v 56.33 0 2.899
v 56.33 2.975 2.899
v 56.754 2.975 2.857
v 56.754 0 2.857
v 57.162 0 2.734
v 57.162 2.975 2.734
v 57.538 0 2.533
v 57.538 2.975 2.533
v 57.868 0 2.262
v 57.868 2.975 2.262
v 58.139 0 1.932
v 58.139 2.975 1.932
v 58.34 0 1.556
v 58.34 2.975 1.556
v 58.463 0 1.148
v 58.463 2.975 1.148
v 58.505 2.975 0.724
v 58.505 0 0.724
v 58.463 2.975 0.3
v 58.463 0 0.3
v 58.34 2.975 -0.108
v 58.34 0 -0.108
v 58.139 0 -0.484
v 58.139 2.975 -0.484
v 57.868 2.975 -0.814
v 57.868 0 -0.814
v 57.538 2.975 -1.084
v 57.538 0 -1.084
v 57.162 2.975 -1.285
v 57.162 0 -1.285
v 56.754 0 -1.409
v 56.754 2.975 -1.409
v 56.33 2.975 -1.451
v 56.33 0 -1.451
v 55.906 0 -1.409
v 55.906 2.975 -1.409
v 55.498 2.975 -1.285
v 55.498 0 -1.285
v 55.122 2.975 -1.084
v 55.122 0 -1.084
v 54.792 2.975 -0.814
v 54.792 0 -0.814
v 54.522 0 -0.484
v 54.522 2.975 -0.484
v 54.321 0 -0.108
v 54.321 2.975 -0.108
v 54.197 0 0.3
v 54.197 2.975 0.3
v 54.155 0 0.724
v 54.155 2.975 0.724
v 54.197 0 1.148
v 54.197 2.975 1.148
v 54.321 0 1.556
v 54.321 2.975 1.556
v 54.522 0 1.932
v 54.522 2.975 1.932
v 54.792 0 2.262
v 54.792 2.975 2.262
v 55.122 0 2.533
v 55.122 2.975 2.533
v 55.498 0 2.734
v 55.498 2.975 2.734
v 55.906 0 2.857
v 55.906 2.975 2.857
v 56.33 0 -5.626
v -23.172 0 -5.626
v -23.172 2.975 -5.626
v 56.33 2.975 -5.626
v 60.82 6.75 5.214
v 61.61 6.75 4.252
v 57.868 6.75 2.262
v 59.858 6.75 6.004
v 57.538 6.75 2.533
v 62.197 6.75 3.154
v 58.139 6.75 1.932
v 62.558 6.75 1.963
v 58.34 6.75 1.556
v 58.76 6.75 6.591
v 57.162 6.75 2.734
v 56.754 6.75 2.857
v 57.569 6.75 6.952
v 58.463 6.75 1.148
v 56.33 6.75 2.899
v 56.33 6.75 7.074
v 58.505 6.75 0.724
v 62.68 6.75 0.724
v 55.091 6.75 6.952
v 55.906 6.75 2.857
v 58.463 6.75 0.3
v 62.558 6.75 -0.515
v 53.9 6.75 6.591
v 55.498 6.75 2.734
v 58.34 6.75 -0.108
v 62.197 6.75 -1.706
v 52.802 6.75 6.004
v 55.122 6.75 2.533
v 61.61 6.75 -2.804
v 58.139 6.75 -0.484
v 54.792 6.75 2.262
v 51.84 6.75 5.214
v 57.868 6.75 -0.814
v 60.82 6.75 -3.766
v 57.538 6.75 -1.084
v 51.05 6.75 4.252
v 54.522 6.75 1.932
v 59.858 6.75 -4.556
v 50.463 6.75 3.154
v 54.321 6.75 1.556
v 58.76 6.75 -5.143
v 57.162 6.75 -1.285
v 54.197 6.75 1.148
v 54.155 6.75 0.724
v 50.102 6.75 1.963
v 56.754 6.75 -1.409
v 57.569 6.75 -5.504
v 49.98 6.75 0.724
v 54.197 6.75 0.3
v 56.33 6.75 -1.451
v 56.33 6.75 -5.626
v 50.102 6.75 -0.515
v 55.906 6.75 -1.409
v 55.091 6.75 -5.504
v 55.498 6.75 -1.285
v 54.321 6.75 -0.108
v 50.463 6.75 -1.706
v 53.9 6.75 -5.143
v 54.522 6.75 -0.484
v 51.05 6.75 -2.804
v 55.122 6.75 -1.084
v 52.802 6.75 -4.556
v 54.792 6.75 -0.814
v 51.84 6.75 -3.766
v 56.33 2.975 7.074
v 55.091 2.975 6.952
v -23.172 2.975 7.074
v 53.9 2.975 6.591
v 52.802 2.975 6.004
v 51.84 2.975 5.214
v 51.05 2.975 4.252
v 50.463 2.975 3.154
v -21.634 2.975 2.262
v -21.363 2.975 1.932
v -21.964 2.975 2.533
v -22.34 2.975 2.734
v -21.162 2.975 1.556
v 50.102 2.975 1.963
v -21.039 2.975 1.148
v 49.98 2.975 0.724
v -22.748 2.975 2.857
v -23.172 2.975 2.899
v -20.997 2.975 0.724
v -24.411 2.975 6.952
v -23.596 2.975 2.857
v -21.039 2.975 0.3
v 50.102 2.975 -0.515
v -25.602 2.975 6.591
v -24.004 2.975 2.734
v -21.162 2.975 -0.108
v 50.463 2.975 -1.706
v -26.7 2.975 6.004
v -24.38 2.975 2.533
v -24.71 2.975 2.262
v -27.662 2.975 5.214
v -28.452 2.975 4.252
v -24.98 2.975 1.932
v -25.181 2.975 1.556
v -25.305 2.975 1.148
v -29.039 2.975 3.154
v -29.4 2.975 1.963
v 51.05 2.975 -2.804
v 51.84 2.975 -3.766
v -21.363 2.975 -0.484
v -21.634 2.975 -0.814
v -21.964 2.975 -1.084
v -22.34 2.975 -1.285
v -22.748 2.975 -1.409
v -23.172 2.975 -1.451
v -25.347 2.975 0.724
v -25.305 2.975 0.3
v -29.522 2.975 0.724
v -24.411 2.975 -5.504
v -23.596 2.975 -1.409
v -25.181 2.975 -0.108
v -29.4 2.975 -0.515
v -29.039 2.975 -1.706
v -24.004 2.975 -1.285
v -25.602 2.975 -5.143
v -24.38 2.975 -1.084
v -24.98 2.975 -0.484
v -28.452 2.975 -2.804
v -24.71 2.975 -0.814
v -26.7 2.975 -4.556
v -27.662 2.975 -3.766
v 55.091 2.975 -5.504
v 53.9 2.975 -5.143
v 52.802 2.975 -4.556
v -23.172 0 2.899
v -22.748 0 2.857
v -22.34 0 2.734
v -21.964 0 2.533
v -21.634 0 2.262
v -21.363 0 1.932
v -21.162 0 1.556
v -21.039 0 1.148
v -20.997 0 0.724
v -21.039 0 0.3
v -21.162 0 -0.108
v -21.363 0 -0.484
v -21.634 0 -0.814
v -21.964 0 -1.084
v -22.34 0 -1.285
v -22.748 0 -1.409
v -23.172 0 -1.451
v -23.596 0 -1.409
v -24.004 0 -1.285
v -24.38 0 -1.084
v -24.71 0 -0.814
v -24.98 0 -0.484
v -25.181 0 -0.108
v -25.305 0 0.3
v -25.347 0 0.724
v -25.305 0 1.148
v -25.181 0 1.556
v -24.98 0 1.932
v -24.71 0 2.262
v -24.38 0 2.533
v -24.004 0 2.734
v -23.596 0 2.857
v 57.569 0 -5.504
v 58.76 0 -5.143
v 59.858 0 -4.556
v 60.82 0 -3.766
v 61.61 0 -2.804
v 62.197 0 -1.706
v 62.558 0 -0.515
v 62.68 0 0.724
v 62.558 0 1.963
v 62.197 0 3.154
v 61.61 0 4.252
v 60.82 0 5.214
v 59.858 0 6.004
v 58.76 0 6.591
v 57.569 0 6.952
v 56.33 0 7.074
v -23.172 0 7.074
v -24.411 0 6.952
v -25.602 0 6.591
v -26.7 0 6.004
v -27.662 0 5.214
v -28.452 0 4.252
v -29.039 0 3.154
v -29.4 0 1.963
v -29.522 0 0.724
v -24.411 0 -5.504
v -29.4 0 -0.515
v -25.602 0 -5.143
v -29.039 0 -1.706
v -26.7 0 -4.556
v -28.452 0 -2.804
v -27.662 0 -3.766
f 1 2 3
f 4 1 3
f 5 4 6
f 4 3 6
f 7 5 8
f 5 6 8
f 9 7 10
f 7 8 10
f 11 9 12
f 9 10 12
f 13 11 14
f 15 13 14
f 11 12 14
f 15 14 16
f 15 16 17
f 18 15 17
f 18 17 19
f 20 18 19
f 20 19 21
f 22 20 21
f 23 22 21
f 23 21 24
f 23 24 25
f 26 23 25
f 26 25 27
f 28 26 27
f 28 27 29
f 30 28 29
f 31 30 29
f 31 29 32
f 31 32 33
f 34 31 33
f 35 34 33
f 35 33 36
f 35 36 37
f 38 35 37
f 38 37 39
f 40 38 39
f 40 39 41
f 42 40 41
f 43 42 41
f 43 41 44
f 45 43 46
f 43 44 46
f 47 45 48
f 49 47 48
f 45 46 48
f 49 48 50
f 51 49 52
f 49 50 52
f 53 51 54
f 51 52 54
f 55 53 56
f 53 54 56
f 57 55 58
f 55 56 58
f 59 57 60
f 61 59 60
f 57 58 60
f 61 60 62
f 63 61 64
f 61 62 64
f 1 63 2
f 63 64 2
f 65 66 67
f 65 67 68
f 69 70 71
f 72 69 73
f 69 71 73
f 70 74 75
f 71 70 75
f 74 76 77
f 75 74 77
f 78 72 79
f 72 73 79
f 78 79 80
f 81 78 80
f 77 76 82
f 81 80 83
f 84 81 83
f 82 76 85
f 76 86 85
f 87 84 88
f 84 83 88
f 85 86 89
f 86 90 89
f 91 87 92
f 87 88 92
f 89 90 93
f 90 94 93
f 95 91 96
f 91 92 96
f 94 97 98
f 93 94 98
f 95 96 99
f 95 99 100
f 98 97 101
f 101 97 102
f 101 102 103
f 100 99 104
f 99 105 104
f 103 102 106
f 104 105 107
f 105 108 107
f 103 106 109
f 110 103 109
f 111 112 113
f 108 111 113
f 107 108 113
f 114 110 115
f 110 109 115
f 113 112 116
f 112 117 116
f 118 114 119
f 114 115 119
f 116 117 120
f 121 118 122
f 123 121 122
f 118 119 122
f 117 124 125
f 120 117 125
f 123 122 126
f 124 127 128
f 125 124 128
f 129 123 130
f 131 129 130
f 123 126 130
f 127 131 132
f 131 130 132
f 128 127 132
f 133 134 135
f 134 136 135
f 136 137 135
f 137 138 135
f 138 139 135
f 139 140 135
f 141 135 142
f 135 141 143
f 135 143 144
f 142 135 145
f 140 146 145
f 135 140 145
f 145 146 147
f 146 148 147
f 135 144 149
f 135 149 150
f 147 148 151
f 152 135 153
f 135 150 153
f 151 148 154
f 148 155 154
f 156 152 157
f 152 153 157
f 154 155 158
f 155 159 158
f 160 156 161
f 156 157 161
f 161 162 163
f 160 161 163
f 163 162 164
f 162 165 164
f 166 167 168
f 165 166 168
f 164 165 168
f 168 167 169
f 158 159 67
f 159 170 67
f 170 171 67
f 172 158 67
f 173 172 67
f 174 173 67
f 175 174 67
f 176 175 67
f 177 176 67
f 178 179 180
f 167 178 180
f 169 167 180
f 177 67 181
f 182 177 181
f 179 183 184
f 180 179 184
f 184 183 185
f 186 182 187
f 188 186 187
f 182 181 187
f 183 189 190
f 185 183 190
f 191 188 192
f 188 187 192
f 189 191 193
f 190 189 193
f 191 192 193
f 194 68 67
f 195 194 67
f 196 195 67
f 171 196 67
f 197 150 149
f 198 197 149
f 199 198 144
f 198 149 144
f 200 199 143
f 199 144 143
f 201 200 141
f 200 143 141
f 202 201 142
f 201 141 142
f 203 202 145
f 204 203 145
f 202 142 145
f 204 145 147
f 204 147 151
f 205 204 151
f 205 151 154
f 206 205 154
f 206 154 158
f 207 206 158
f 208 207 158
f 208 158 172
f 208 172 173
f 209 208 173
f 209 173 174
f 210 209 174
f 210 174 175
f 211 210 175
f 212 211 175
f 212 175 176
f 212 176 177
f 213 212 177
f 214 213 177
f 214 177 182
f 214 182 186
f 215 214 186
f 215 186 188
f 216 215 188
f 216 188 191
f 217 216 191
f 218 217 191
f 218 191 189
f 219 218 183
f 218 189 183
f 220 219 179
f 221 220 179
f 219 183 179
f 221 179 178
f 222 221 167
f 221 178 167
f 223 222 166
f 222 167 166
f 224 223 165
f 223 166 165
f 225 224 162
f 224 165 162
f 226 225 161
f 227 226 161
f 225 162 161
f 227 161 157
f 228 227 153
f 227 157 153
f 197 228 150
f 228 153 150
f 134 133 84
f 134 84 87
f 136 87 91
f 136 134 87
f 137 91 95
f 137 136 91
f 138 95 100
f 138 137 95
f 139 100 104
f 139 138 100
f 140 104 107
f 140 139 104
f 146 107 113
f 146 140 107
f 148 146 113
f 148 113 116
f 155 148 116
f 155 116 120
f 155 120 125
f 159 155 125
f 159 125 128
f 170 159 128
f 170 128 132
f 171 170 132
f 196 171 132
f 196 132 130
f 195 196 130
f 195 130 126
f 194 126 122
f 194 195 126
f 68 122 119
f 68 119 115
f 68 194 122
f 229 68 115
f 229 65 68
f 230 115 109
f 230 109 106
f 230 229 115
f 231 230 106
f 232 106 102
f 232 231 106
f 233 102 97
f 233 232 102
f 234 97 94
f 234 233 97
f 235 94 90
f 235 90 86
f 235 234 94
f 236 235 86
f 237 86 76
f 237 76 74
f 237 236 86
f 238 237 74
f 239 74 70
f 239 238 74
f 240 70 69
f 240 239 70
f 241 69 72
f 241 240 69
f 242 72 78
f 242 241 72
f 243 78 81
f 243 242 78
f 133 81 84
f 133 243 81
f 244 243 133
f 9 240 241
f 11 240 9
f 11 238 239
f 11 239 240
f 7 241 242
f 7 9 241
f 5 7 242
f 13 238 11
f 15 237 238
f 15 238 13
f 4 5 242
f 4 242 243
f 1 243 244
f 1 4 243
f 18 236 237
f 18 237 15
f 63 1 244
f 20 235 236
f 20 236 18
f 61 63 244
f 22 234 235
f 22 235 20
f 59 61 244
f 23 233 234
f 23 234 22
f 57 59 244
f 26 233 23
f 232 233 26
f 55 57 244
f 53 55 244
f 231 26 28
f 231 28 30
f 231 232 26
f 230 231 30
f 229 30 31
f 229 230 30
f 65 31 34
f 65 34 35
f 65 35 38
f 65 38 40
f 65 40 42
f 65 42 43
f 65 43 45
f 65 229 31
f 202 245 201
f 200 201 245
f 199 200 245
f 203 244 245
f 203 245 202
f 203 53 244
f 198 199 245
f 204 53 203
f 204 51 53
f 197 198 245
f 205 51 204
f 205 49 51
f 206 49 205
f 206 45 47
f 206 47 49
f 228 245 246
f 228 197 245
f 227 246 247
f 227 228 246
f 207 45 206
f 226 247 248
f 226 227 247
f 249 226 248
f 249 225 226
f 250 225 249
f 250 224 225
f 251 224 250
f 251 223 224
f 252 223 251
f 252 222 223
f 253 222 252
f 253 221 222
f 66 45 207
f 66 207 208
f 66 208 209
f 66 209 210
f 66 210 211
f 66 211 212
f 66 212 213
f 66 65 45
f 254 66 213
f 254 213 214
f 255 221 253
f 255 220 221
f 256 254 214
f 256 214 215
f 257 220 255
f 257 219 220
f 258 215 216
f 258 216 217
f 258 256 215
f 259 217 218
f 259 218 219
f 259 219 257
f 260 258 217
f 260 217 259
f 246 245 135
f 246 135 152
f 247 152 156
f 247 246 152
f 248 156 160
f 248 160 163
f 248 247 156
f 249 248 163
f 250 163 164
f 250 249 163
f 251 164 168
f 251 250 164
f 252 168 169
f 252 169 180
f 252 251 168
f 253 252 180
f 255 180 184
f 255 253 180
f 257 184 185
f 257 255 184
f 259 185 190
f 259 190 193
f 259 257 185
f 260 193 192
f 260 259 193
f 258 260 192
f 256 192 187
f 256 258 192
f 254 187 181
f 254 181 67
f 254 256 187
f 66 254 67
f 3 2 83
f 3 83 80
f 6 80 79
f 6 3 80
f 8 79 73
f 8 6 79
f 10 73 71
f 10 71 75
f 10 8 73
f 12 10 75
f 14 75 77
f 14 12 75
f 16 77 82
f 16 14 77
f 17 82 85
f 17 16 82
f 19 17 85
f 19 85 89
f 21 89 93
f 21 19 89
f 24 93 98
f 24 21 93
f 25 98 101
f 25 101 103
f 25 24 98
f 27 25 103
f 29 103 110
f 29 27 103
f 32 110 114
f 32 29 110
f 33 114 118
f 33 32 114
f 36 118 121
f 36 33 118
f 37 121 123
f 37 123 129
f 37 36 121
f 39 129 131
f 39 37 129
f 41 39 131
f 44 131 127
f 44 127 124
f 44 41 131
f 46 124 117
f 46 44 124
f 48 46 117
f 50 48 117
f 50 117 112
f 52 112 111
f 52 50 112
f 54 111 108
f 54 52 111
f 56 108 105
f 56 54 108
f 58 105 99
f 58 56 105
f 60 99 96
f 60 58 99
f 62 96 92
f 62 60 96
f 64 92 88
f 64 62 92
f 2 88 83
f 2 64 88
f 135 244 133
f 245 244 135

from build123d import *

# Parameters (mm, degrees)
BOSS_EXTRUDE1_DEPTH = 2.975
SKETCH2_R           = 2.175
SKETCH2_R_2         = 2.175000000000007
CUT_EXTRUDE1_DEPTH  = 12.7
SKETCH3_R           = 2.175000000000007
BOSS_EXTRUDE2_DEPTH = 3.7750000000000004


with BuildPart() as part:
    # Sketch1 → Boss-Extrude1 (new body)
    with BuildSketch(Plane(origin=(0, 0, 0), x_dir=(1, 0, 0), z_dir=(0, 1, 0))):
        with BuildLine():
            Line((-23.171929824561392, 5.625877192982455), (56.3300701754386, 5.625877192982454))
            ThreePointArc((56.3300701754386, 5.625877192982454), (62.6800701754386, -0.7241228070175446), (56.3300701754386, -7.074122807017544))
            Line((56.3300701754386, -7.074122807017544), (-23.171929824561392, -7.074122807017544))
            ThreePointArc((-23.171929824561392, -7.074122807017544), (-29.52192982456139, -0.7241228070175436), (-23.171929824561392, 5.625877192982455))
        make_face()
    extrude(amount=BOSS_EXTRUDE1_DEPTH)

    # Sketch2 → Cut-Extrude1 (cut)
    with BuildSketch(Plane(origin=(0, 2.975, 0), x_dir=(1, 0, 0), z_dir=(0, 1, 0))):
        with Locations(Location((-23.171929824561392, -0.7241228070175446, 0), (0, 0, 270))):
            Circle(SKETCH2_R)
        with Locations(Location((56.3300701754386, -0.7241228070175446, 0), (0, 0, 270))):
            Circle(SKETCH2_R_2)
    extrude(amount=-CUT_EXTRUDE1_DEPTH, mode=Mode.SUBTRACT)

    # Sketch3 → Boss-Extrude2 (add)
    with BuildSketch(Plane(origin=(0, 2.975, 0), x_dir=(1, 0, 0), z_dir=(0, 1, 0))):
        with BuildLine():
            ThreePointArc((56.3300701754386, 5.625877192982454), (62.6800701754386, -0.7241228070175451), (56.3300701754386, -7.074122807017544))
            ThreePointArc((56.3300701754386, -7.074122807017544), (49.9800701754386, -0.7241228070175443), (56.3300701754386, 5.625877192982454))
        make_face()
        with Locations(Location((56.3300701754386, -0.7241228070175446, 0), (0, 0, 270))):
            Circle(SKETCH3_R, mode=Mode.SUBTRACT)
    extrude(amount=BOSS_EXTRUDE2_DEPTH)


solid = part.part
